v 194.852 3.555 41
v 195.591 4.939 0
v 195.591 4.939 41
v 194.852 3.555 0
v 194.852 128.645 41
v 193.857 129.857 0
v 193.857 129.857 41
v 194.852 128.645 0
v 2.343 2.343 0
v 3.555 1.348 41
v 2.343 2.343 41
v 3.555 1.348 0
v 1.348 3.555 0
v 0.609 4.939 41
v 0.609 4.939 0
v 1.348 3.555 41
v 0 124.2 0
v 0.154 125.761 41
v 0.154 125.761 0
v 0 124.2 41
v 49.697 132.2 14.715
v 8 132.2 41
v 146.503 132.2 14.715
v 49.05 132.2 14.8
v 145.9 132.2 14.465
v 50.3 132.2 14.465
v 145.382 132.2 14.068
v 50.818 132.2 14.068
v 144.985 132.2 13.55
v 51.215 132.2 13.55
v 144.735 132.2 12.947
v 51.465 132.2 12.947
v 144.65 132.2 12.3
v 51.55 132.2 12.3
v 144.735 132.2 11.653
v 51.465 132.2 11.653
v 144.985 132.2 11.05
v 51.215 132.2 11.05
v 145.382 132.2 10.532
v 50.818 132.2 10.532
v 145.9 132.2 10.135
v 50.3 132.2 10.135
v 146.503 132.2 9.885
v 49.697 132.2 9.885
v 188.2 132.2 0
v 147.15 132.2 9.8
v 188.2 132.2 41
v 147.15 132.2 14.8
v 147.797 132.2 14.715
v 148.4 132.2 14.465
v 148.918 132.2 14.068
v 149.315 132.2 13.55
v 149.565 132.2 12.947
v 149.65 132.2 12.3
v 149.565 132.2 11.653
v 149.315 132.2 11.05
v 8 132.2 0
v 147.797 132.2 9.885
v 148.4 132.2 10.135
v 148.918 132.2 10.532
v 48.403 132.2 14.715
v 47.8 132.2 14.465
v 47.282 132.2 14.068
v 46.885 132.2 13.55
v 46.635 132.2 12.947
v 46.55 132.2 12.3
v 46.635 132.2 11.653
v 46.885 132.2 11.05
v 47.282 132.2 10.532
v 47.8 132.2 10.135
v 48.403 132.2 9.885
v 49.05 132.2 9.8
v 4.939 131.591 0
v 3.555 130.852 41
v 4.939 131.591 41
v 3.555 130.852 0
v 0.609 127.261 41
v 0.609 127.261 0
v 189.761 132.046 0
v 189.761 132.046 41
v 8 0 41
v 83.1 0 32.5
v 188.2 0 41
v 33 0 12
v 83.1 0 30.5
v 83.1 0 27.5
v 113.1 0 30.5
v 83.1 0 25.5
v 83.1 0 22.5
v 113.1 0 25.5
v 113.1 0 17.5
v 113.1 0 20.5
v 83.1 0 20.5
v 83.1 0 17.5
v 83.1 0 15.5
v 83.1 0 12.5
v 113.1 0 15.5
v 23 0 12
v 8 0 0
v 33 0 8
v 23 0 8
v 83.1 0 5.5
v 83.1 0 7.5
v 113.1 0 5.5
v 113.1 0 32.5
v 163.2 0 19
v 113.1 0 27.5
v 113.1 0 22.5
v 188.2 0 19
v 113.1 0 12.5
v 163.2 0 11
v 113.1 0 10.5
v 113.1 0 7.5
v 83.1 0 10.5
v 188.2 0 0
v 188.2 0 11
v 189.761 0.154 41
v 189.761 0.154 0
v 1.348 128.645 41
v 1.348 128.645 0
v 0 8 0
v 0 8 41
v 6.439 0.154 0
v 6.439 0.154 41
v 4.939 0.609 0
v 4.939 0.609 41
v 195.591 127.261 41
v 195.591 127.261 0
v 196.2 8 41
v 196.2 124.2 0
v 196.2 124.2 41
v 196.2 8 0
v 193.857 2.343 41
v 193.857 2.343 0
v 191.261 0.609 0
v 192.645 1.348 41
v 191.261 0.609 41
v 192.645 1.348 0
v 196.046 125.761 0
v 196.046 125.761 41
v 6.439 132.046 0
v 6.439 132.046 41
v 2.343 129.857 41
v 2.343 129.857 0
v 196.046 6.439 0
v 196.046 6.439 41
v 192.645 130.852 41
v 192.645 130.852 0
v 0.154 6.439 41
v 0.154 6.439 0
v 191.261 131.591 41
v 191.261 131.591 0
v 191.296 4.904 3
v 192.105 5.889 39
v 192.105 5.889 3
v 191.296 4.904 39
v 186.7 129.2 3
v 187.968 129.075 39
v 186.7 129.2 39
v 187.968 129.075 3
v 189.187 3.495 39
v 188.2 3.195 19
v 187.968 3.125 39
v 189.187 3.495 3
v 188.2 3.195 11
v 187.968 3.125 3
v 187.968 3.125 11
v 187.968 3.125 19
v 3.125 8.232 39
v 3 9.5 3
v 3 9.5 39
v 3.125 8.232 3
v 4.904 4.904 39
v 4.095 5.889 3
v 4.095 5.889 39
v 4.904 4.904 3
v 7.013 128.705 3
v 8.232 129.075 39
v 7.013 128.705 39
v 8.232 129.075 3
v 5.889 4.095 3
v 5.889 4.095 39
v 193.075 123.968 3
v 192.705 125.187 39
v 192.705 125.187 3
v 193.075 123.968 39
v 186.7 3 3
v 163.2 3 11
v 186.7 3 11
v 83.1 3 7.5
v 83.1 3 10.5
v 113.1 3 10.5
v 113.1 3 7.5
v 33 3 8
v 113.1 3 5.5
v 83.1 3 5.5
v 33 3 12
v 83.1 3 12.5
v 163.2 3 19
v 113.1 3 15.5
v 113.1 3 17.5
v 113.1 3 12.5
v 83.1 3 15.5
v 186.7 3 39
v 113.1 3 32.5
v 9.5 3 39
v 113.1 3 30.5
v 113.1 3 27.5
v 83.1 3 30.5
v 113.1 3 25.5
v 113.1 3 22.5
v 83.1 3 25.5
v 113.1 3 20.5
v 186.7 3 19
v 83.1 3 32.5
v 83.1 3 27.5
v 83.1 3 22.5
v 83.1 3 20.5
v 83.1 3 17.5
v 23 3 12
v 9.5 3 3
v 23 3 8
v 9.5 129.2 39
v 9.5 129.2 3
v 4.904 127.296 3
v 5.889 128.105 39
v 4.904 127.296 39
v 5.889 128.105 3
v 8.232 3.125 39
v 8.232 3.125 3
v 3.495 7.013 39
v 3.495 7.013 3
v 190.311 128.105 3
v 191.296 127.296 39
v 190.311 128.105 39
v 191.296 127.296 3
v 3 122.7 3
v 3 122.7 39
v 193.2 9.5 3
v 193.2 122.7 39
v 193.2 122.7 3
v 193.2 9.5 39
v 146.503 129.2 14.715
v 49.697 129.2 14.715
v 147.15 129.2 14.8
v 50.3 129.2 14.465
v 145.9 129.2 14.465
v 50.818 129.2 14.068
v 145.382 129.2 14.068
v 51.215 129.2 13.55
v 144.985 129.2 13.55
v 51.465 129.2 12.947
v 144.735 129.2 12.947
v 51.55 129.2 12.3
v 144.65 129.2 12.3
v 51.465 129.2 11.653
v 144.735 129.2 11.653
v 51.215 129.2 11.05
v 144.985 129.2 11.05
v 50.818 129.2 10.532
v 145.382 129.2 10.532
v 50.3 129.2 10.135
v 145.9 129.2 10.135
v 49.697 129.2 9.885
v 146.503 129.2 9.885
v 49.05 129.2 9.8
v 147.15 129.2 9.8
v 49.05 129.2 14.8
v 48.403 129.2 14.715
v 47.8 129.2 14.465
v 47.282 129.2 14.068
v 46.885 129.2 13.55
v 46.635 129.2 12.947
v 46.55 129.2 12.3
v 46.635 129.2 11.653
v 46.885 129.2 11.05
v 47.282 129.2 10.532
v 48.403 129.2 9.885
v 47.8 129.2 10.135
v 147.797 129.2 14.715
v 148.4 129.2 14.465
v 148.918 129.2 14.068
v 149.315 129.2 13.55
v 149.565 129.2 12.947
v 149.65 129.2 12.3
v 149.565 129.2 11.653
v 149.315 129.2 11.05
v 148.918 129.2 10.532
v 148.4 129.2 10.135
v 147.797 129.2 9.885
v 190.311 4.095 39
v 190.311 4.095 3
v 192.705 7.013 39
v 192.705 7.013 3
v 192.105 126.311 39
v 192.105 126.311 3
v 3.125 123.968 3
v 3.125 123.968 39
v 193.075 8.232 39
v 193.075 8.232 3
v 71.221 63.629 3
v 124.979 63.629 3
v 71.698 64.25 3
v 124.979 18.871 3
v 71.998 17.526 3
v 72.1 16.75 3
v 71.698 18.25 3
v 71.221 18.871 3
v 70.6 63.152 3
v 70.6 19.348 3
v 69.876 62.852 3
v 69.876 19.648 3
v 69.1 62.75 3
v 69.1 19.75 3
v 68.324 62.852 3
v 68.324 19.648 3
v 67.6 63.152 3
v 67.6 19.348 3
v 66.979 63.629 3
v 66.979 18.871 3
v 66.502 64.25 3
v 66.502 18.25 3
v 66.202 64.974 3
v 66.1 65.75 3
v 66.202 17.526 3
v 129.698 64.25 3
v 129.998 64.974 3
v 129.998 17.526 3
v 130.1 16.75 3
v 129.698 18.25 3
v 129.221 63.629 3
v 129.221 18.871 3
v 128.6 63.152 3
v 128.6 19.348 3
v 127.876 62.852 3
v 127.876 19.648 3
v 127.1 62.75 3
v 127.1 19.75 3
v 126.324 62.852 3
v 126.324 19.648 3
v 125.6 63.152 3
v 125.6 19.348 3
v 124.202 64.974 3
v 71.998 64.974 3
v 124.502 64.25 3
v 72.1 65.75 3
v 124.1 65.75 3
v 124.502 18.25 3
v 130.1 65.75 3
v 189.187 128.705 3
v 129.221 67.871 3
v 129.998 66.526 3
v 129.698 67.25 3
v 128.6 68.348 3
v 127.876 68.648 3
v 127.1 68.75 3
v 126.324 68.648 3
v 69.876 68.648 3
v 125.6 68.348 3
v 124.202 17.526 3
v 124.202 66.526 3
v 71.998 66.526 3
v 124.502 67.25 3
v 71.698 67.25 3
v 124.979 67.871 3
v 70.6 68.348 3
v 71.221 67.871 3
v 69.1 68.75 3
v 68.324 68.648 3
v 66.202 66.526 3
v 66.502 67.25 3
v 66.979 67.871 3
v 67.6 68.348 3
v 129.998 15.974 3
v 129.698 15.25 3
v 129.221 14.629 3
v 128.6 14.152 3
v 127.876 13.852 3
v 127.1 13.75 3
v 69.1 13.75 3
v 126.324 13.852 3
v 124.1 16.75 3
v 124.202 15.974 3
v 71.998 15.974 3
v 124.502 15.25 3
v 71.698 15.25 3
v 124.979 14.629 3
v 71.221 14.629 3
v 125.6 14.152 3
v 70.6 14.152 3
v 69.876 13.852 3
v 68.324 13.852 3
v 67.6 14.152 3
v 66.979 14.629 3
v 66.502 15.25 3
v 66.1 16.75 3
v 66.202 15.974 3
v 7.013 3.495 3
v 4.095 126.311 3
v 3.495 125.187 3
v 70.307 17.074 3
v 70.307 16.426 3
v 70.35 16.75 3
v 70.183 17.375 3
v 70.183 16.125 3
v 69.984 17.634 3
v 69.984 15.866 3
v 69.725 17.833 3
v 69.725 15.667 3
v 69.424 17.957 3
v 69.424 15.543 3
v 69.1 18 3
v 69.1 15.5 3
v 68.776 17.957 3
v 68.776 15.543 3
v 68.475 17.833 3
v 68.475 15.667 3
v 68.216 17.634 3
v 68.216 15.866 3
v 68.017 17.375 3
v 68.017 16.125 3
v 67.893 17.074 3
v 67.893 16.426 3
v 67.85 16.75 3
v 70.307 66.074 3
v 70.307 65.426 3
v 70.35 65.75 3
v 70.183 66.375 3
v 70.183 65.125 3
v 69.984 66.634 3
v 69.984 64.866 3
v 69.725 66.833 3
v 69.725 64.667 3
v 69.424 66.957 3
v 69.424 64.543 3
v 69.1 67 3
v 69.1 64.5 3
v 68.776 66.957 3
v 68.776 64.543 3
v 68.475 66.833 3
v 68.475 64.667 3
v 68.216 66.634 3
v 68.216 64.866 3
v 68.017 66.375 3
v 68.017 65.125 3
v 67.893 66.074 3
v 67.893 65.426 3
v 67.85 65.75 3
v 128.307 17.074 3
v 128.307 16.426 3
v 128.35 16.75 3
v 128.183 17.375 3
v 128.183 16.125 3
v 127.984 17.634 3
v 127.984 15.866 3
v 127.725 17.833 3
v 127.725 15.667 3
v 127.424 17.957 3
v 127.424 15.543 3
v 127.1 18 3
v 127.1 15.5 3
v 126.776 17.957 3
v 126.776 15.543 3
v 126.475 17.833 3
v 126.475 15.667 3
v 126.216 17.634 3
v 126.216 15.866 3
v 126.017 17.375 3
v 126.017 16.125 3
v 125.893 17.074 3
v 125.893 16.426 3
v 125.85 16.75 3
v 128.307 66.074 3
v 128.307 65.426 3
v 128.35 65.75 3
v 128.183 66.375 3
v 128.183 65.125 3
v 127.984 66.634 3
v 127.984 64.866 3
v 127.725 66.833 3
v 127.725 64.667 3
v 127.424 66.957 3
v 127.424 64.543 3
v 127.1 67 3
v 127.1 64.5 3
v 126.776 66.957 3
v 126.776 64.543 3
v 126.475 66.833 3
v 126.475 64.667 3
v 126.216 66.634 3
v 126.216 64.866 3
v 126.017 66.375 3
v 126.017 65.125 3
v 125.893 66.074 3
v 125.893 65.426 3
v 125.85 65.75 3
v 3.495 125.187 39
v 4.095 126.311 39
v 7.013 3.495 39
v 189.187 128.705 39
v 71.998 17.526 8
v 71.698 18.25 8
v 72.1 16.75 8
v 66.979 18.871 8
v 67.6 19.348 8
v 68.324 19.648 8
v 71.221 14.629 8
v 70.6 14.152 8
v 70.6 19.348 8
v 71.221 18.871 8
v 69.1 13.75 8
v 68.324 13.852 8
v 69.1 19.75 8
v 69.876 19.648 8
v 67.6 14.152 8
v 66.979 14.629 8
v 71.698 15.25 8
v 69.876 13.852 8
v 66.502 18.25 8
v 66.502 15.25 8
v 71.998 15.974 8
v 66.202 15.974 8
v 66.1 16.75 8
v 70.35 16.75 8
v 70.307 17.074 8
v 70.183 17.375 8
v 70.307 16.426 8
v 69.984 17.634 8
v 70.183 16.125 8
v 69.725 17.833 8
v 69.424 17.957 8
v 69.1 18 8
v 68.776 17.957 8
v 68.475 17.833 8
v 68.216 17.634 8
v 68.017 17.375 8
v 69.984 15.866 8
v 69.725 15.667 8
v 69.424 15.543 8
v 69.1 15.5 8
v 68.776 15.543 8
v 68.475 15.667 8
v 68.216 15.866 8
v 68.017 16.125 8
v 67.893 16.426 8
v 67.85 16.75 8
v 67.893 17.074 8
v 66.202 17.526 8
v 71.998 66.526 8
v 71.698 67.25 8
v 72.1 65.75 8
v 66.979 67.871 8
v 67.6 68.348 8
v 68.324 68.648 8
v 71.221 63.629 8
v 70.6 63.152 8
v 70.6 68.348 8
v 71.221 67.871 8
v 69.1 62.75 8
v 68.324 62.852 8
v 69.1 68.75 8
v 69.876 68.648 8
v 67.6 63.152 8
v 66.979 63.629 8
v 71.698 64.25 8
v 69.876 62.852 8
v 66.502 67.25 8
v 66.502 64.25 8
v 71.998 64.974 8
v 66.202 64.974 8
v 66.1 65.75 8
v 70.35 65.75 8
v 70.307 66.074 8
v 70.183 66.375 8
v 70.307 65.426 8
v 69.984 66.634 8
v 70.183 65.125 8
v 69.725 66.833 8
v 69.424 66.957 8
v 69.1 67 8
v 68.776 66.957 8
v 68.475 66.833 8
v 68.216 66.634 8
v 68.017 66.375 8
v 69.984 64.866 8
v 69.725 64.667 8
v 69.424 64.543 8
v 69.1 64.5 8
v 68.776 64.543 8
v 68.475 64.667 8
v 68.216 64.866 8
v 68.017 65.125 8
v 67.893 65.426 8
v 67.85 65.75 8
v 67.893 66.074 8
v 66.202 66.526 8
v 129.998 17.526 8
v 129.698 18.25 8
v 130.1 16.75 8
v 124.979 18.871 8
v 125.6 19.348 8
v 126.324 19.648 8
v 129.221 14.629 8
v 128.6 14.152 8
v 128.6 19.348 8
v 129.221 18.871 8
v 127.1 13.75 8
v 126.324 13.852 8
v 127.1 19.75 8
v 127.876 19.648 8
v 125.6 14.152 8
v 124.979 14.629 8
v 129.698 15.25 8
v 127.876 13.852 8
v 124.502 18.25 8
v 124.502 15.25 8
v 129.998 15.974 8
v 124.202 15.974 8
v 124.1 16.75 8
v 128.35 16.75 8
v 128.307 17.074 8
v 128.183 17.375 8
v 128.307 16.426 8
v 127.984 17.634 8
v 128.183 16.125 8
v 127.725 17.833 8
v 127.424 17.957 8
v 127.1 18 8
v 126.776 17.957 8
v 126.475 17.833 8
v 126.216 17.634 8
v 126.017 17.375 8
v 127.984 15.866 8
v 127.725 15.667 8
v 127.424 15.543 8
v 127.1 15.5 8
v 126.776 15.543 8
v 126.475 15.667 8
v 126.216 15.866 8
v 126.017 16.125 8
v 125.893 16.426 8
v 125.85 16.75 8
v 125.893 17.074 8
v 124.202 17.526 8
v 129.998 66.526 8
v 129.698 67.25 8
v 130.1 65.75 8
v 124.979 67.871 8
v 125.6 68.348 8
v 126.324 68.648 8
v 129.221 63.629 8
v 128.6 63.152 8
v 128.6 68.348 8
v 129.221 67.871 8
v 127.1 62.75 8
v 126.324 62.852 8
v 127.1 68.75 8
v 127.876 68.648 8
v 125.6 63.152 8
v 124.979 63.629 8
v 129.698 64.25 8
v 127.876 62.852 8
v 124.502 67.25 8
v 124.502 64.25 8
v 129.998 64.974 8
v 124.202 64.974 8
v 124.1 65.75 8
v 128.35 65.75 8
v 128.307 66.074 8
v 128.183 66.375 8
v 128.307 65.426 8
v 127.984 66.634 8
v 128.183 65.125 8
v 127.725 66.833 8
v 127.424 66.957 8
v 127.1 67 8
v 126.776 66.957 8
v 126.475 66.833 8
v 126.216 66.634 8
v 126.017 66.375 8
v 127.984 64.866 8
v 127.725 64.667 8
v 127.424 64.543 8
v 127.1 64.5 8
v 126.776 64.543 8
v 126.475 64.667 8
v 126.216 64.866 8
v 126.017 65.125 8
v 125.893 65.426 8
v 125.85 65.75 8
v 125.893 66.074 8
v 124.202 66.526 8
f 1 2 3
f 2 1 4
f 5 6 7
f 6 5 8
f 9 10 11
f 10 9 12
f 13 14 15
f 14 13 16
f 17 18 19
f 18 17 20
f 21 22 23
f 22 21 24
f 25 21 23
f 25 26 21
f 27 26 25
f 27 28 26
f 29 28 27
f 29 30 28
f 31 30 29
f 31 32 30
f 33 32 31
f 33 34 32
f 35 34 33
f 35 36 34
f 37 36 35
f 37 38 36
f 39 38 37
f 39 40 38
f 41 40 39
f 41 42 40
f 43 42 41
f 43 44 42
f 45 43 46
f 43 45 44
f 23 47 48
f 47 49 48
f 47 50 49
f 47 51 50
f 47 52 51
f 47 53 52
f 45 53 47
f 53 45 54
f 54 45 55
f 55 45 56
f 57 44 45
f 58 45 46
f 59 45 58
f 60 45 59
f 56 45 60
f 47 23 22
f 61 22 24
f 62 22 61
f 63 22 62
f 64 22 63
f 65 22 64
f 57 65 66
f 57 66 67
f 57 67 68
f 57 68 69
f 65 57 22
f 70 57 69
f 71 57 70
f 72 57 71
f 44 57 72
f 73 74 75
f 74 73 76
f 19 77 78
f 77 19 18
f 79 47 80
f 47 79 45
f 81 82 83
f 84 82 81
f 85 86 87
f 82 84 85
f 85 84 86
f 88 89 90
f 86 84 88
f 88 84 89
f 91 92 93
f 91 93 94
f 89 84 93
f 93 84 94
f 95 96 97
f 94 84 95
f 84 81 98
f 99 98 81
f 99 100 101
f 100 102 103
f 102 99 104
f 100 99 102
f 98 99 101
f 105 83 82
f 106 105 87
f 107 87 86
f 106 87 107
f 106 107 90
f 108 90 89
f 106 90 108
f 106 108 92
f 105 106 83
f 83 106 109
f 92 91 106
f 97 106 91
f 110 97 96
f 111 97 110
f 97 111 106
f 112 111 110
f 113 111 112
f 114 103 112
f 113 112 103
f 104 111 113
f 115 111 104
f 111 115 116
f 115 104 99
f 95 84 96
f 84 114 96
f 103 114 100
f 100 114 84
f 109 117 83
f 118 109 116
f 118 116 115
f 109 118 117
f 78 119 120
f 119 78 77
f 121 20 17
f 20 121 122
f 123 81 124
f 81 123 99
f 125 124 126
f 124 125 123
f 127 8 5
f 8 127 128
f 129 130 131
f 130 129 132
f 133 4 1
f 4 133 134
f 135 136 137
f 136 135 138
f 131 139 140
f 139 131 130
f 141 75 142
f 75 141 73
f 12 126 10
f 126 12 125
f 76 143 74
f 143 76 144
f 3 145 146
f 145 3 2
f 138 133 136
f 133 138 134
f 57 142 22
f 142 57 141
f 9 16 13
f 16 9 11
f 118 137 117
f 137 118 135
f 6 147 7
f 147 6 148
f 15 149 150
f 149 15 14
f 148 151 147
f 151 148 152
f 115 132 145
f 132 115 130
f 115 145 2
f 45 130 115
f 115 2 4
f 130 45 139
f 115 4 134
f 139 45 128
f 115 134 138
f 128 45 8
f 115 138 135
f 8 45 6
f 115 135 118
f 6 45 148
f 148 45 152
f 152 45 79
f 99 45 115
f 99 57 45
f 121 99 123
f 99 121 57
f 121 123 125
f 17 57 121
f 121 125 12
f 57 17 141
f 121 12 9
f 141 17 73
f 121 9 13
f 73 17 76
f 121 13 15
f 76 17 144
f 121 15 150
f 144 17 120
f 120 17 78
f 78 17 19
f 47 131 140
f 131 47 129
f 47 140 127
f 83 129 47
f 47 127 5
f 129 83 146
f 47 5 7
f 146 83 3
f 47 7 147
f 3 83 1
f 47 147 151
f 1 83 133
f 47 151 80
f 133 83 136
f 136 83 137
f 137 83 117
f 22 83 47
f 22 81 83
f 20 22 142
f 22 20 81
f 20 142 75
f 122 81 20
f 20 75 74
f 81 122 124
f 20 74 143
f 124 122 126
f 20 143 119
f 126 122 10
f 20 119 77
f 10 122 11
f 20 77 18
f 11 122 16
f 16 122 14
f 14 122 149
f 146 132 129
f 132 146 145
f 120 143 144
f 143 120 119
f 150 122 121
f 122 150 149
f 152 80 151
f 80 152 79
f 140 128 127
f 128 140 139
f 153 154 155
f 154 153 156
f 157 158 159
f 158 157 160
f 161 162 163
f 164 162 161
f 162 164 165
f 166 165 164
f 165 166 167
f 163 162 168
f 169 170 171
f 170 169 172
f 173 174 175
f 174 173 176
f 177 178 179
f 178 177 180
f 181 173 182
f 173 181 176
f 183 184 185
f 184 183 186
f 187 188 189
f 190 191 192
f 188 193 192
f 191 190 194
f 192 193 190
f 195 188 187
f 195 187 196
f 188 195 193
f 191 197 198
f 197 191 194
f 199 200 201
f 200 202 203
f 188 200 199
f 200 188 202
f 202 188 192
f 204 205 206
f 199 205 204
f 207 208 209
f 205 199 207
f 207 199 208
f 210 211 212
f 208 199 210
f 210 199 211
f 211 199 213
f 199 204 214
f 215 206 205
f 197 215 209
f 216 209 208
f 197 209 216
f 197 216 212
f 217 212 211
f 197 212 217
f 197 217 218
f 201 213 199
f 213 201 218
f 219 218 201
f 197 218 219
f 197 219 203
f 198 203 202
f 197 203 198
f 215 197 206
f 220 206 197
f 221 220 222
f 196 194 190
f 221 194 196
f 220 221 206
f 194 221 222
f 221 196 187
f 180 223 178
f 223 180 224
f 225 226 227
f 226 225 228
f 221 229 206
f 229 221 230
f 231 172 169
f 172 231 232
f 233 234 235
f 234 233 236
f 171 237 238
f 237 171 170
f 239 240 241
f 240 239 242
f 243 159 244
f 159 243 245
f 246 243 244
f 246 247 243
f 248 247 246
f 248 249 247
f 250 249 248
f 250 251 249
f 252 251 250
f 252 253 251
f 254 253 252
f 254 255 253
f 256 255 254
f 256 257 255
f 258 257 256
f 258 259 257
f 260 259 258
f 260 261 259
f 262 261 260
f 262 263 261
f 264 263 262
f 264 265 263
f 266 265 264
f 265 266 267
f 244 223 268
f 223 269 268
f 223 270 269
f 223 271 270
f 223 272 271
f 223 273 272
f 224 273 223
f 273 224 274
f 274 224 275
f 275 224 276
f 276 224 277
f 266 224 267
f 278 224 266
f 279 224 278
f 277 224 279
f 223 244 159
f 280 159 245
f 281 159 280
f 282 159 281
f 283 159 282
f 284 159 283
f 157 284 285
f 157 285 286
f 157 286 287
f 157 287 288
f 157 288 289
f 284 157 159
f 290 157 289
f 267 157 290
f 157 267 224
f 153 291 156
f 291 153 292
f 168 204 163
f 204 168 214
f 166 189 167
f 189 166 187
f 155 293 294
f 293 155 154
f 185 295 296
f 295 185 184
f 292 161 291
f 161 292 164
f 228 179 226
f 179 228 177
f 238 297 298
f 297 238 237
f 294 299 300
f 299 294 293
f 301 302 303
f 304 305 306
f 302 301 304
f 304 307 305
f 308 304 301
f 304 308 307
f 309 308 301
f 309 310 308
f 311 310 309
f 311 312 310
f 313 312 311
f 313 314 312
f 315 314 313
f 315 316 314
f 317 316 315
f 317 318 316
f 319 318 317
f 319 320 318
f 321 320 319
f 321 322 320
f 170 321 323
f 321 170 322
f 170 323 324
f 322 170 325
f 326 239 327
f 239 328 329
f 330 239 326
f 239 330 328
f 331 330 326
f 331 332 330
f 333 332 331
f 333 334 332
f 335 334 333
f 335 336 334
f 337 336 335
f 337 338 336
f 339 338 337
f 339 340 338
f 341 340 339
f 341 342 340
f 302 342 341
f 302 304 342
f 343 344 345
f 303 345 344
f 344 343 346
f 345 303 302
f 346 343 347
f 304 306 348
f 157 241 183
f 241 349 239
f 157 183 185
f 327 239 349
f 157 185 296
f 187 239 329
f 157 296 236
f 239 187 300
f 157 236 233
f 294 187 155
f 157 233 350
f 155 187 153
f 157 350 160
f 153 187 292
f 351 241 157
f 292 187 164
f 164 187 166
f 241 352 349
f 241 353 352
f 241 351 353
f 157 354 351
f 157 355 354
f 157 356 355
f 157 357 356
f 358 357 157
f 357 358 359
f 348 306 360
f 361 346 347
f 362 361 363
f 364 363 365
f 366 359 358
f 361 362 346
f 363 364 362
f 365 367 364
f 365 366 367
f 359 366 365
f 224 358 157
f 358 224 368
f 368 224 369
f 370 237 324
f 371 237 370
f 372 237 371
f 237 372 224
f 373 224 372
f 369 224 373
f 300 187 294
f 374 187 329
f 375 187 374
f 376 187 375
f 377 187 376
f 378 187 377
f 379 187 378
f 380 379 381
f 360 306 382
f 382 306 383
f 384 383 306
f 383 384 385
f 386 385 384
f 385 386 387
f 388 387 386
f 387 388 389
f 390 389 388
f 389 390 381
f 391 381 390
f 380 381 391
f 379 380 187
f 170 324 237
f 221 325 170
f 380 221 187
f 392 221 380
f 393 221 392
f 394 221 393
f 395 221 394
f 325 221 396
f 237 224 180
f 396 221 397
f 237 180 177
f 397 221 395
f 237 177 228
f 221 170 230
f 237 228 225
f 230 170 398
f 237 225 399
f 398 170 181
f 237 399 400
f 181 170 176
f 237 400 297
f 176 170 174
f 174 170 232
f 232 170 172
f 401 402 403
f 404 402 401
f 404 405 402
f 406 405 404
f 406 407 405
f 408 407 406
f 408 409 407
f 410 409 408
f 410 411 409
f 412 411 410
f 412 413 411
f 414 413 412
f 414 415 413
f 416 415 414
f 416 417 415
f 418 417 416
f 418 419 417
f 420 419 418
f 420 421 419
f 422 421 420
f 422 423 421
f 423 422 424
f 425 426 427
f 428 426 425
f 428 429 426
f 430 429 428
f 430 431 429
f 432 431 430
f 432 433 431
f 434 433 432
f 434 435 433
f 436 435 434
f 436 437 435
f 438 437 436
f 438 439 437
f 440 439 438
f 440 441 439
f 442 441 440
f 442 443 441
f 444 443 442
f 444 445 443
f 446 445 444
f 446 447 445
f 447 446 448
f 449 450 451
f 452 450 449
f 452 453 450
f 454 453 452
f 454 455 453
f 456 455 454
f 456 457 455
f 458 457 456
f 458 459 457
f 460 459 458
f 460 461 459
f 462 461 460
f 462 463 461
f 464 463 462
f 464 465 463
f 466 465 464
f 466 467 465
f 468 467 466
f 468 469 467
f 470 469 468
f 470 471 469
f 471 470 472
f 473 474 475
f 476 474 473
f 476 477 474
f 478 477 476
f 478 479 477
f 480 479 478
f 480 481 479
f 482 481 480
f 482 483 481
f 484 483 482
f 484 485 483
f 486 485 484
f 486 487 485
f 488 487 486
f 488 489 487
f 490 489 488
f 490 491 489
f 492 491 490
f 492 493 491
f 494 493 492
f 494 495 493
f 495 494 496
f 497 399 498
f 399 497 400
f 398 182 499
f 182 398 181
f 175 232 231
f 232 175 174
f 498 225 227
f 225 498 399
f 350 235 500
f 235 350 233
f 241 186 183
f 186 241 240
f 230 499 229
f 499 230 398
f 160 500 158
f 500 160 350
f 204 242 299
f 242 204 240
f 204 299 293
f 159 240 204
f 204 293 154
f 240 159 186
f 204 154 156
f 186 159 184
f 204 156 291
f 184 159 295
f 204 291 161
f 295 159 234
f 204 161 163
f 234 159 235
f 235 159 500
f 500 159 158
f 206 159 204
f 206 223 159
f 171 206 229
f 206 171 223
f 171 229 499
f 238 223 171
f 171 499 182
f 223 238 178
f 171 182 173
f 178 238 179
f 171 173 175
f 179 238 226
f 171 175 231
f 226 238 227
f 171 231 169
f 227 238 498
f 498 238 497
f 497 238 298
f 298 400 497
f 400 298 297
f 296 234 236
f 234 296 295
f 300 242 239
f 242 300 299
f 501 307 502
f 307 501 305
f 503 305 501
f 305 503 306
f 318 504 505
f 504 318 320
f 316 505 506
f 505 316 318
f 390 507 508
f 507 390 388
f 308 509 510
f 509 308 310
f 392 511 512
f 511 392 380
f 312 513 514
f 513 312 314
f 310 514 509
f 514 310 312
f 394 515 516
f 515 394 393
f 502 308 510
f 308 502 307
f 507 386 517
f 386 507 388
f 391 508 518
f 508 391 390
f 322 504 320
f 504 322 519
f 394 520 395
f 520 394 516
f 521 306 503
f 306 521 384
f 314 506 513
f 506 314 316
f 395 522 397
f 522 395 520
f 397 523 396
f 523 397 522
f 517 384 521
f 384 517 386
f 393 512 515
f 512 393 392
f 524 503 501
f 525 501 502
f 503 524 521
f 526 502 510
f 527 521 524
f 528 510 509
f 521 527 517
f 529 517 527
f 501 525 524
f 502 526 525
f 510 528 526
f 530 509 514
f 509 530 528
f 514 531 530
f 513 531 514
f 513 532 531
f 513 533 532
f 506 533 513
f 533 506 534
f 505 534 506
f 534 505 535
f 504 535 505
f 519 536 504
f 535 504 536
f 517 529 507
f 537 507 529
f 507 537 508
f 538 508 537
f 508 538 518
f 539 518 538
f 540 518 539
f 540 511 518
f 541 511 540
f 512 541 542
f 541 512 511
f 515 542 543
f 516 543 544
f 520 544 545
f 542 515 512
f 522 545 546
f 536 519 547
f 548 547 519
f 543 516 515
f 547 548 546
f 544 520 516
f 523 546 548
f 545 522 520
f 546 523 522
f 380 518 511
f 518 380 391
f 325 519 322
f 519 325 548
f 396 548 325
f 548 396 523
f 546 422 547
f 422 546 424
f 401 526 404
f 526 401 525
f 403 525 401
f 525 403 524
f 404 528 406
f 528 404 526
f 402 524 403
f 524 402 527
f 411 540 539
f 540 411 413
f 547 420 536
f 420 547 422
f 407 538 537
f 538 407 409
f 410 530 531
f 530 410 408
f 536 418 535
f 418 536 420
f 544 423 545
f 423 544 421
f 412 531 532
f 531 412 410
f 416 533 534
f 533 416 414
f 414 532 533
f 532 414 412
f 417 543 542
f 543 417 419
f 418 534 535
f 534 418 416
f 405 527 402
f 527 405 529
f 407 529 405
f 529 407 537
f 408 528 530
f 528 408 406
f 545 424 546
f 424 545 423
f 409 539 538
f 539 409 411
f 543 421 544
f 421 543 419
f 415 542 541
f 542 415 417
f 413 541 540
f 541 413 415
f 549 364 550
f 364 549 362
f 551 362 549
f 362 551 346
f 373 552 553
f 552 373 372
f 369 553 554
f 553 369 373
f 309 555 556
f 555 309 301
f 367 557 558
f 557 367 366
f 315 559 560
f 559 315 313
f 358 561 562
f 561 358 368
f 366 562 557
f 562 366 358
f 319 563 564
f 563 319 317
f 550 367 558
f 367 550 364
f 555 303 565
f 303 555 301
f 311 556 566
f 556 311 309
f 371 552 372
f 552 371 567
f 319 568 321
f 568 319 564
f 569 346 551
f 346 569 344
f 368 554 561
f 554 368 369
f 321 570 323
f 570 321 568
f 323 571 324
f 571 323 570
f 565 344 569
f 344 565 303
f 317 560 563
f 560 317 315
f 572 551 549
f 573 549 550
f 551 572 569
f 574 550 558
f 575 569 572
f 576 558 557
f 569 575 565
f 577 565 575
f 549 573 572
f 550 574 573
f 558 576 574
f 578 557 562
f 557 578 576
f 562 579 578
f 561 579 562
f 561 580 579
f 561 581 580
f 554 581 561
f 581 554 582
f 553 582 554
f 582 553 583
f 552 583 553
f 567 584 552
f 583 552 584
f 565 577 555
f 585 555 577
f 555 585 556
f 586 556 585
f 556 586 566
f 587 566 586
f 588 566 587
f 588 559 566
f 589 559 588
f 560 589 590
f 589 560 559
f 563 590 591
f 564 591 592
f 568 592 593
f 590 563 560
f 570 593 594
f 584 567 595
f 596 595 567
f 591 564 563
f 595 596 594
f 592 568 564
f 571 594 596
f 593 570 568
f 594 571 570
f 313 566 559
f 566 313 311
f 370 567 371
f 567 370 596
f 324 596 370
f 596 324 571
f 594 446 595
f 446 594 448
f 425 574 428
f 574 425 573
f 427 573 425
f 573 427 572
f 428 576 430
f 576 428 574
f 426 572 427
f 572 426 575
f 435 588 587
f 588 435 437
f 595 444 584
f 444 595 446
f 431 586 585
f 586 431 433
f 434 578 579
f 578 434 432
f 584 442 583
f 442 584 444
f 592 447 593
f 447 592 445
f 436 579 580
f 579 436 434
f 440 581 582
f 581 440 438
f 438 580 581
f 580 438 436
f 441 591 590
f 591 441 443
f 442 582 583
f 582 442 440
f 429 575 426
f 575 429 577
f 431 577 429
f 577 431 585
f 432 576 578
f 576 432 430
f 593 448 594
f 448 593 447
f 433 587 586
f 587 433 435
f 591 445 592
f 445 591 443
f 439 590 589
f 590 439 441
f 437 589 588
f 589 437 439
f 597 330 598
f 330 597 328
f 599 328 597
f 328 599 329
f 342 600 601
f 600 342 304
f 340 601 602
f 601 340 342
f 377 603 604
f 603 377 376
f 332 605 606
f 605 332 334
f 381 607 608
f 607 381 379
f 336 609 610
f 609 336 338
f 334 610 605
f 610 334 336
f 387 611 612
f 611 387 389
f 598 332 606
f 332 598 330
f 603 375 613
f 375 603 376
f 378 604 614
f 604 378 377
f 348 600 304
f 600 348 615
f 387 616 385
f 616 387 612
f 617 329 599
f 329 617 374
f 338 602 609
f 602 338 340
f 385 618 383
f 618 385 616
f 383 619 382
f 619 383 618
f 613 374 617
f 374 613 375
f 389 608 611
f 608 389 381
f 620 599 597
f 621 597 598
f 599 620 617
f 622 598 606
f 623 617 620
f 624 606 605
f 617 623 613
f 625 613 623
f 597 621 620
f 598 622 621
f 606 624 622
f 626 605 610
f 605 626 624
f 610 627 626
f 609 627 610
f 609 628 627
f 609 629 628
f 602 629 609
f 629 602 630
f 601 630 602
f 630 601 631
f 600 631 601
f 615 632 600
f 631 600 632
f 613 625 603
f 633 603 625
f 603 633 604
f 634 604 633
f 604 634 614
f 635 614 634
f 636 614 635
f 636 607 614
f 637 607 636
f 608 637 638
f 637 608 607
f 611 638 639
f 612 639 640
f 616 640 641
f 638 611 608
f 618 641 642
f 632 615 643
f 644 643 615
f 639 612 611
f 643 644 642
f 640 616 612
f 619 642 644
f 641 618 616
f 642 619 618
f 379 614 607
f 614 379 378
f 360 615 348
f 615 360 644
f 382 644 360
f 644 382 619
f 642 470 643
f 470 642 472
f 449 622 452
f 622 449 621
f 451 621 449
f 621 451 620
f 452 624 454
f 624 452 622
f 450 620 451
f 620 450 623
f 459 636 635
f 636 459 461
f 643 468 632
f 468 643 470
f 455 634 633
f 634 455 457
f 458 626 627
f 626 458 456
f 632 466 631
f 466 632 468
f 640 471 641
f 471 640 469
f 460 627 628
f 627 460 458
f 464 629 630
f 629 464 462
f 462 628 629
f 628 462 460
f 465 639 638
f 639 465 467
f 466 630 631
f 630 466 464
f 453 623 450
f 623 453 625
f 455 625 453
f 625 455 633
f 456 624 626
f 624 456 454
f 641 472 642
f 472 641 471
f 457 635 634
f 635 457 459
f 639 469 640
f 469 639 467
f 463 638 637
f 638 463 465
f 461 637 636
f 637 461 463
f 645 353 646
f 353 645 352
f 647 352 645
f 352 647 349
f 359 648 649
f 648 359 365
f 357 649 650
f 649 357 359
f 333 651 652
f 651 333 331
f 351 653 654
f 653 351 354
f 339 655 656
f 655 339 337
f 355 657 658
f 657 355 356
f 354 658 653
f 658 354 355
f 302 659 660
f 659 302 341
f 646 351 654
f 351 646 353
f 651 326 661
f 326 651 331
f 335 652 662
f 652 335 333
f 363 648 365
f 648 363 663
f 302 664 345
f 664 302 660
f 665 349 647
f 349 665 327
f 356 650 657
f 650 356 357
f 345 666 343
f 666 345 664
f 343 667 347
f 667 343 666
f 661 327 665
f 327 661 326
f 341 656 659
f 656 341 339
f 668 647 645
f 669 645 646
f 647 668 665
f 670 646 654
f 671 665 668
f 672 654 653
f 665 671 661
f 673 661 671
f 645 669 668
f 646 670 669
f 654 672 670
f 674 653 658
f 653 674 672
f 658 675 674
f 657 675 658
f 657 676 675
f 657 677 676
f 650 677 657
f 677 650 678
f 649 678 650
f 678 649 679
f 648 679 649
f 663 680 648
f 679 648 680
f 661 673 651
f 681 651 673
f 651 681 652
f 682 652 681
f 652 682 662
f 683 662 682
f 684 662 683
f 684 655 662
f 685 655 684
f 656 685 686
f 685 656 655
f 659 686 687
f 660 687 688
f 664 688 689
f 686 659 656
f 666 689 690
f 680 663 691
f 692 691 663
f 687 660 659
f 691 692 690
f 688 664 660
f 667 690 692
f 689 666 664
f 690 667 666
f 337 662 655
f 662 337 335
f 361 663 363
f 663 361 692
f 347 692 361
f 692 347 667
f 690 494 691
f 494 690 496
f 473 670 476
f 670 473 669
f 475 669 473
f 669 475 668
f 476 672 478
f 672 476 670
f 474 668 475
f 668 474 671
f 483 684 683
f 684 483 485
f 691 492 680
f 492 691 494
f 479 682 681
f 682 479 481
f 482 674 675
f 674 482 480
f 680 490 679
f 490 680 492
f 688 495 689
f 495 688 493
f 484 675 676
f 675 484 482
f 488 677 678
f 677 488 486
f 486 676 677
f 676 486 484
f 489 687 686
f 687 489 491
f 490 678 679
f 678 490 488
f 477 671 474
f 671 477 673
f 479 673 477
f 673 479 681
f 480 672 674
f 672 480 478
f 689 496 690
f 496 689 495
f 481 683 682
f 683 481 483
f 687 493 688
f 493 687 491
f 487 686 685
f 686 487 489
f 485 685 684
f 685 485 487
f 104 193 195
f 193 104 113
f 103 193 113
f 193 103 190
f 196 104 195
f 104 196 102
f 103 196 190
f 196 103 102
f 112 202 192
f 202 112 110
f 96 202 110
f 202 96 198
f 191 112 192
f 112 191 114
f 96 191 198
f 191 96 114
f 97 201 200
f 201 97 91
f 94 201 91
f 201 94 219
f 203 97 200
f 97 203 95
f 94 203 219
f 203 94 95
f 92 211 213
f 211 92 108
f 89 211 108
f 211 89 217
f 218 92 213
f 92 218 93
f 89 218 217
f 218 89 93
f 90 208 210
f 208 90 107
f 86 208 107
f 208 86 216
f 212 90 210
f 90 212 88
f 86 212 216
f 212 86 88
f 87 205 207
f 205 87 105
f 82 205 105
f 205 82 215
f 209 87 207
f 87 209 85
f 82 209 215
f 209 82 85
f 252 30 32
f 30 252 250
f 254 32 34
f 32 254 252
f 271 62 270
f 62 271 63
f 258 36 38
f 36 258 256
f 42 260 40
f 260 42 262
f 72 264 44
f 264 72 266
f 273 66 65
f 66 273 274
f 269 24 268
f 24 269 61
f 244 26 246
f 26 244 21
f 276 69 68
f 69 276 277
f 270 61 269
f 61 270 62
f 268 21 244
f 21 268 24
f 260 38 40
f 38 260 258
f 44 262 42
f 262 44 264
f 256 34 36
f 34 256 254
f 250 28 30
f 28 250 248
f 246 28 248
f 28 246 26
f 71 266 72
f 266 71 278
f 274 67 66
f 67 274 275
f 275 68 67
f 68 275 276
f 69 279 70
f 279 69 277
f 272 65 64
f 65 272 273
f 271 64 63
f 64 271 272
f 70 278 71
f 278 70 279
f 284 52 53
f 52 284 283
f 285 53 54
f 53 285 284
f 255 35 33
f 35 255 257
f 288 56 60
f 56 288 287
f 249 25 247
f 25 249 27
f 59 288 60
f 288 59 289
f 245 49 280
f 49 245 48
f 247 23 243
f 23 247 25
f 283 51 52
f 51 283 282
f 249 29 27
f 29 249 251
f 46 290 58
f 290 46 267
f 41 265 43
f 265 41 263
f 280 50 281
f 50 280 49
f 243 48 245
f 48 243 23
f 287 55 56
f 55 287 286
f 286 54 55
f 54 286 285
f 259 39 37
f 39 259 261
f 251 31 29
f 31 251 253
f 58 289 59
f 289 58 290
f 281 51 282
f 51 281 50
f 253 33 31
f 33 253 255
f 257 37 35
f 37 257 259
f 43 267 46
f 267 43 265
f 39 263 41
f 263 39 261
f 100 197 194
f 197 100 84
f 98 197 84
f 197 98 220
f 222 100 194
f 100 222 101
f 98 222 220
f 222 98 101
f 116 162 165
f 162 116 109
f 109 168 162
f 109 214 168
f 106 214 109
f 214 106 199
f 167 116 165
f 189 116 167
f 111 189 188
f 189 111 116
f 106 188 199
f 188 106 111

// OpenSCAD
// Limen Home Brain Enclosure
// Designed by Limen, February 2026
// 
// Components:
// - Raspberry Pi 4 (85.6 x 56.5 x 17mm)
// - Waveshare 7.5" E-Ink HAT (screen: 170.2 x 111.2mm)
// - Pi Camera Module 3 (25 x 23.9 x 9mm)
//
// To use: Open in OpenSCAD, render, export as STL
// Download OpenSCAD: https://openscad.org/downloads.html

/* [Main Dimensions] */
// Wall thickness
wall = 3;
// Corner radius
corner_r = 8;
// Tolerance for components
tolerance = 0.5;

/* [E-Ink Display] */
eink_width = 170.2;
eink_height = 111.2;
eink_thickness = 1.18;
eink_bezel = 3.5; // visible bezel around screen

/* [Raspberry Pi 4] */
pi_width = 85.6;
pi_length = 56.5;
pi_height = 17;
pi_mount_spacing_x = 58;
pi_mount_spacing_y = 49;

/* [Camera Module 3] */
cam_width = 25;
cam_height = 23.9;
cam_depth = 9;
cam_lens_dia = 8;

/* [Calculated Dimensions] */
// Internal cavity
internal_width = eink_width + 20; // extra space for wiring
internal_height = eink_height + 15;
internal_depth = pi_height + 15 + wall; // pi + hat + clearance

// External dimensions
ext_width = internal_width + 2*wall;
ext_height = internal_height + 2*wall;
ext_depth = internal_depth + 2*wall;

/* [Modules] */

// Rounded rectangle helper
module rounded_rect(w, h, d, r) {
    hull() {
        for (x = [r, w-r]) {
            for (y = [r, h-r]) {
                translate([x, y, 0])
                cylinder(r=r, h=d, $fn=32);
            }
        }
    }
}

// Main body shell
module body_shell() {
    difference() {
        // Outer shell
        rounded_rect(ext_width, ext_height, ext_depth, corner_r);
        
        // Inner cavity
        translate([wall, wall, wall])
        rounded_rect(internal_width, internal_height, internal_depth + 1, corner_r - wall/2);
    }
}

// Front panel with display cutout
module front_panel() {
    difference() {
        // Panel
        rounded_rect(ext_width, ext_height, wall, corner_r);
        
        // E-ink display cutout
        translate([(ext_width - eink_width)/2, (ext_height - eink_height)/2 + 5, -1])
        rounded_rect(eink_width, eink_height, wall + 2, 2);
        
        // Camera lens hole (positioned above display)
        translate([ext_width/2, ext_height - 15, -1])
        cylinder(d=cam_lens_dia + 2, h=wall + 2, $fn=32);
    }
}

// Raspberry Pi mounting posts
module pi_mounts() {
    mount_h = 5; // standoff height
    mount_d = 6; // post diameter
    hole_d = 2.5; // M2.5 screw hole
    
    // Position Pi centered in enclosure
    pi_offset_x = (internal_width - pi_width) / 2 + wall;
    pi_offset_y = wall + 10; // offset from bottom
    
    // Four mounting posts
    for (x = [0, pi_mount_spacing_x]) {
        for (y = [0, pi_mount_spacing_y]) {
            translate([pi_offset_x + (pi_width - pi_mount_spacing_x)/2 + x, 
                       pi_offset_y + (pi_length - pi_mount_spacing_y)/2 + y, 
                       wall]) {
                difference() {
                    cylinder(d=mount_d, h=mount_h, $fn=24);
                    cylinder(d=hole_d, h=mount_h + 1, $fn=24);
                }
            }
        }
    }
}

// Ventilation slots
module vent_slots() {
    slot_w = 30;
    slot_h = 2;
    slot_spacing = 5;
    num_slots = 6;
    
    // Back vents
    translate([ext_width/2 - slot_w/2, -1, ext_depth/2])
    for (i = [0:num_slots-1]) {
        translate([0, 0, i * slot_spacing - (num_slots * slot_spacing)/2])
        cube([slot_w, wall + 2, slot_h]);
    }
}

// USB-C power port cutout
module power_port() {
    // USB-C is approximately 8.4mm x 2.6mm
    port_w = 10;
    port_h = 4;
    
    translate([wall + 20, -1, wall + 5])
    cube([port_w, wall + 2, port_h]);
}

// Cable routing slot
module cable_slot() {
    translate([ext_width - wall - 30, -1, wall + 8])
    cube([25, wall + 2, 8]);
}

// Stand / easel back
module stand() {
    stand_angle = 15;
    stand_h = ext_height * 0.6;
    stand_w = ext_width * 0.4;
    stand_thick = 3;
    
    translate([ext_width/2, 0, 0])
    rotate([90 - stand_angle, 0, 0])
    translate([-stand_w/2, 0, 0])
    difference() {
        cube([stand_w, stand_h, stand_thick]);
        // Hinge cutout (simplified)
        translate([5, stand_h - 10, -1])
        cylinder(d=3, h=stand_thick + 2, $fn=16);
        translate([stand_w - 5, stand_h - 10, -1])
        cylinder(d=3, h=stand_thick + 2, $fn=16);
    }
}

// Wall mount holes
module wall_mounts() {
    hole_d = 5;
    // Two keyhole slots for wall mounting
    translate([ext_width * 0.25, ext_height + 1, ext_depth * 0.3])
    rotate([90, 0, 0])
    cylinder(d=hole_d, h=wall + 2, $fn=24);
    
    translate([ext_width * 0.75, ext_height + 1, ext_depth * 0.3])
    rotate([90, 0, 0])
    cylinder(d=hole_d, h=wall + 2, $fn=24);
}

/* [Assembly] */

// Complete enclosure
module complete_enclosure() {
    difference() {
        union() {
            body_shell();
            pi_mounts();
        }
        vent_slots();
        power_port();
        cable_slot();
        wall_mounts();
    }
}

// Render options - uncomment what you need:

// Option 1: Complete body (back + sides)
complete_enclosure();

// Option 2: Front panel only (for separate printing)
// translate([0, 0, ext_depth + 10])
// front_panel();

// Option 3: Stand (print separately)
// translate([0, -50, 0])
// stand();

// Option 4: Everything together for visualization
// color("DarkSlateGray", 0.8) complete_enclosure();
// color("DarkSlateGray", 0.9) translate([0, 0, ext_depth - wall]) front_panel();
// color("Gray", 0.5) translate([0, -40, 0]) stand();

/* 
PRINTING NOTES:
- Print body upside down (opening facing up) for best results
- Front panel prints flat
- Stand prints flat
- Recommended: PETG or ABS for heat resistance near Pi
- Layer height: 0.2mm
- Infill: 20-30%
- Supports: Yes, for cable/vent cutouts

POST-PROCESSING:
- Sand edges if needed
- E-ink display secured with small dabs of hot glue or mounting tape
- Pi secured with M2.5 screws into standoffs
- Camera module can be hot-glued or use a small bracket

TOTAL EXTERNAL DIMENSIONS:
- Width: ~196mm
- Height: ~132mm  
- Depth: ~43mm
*/
